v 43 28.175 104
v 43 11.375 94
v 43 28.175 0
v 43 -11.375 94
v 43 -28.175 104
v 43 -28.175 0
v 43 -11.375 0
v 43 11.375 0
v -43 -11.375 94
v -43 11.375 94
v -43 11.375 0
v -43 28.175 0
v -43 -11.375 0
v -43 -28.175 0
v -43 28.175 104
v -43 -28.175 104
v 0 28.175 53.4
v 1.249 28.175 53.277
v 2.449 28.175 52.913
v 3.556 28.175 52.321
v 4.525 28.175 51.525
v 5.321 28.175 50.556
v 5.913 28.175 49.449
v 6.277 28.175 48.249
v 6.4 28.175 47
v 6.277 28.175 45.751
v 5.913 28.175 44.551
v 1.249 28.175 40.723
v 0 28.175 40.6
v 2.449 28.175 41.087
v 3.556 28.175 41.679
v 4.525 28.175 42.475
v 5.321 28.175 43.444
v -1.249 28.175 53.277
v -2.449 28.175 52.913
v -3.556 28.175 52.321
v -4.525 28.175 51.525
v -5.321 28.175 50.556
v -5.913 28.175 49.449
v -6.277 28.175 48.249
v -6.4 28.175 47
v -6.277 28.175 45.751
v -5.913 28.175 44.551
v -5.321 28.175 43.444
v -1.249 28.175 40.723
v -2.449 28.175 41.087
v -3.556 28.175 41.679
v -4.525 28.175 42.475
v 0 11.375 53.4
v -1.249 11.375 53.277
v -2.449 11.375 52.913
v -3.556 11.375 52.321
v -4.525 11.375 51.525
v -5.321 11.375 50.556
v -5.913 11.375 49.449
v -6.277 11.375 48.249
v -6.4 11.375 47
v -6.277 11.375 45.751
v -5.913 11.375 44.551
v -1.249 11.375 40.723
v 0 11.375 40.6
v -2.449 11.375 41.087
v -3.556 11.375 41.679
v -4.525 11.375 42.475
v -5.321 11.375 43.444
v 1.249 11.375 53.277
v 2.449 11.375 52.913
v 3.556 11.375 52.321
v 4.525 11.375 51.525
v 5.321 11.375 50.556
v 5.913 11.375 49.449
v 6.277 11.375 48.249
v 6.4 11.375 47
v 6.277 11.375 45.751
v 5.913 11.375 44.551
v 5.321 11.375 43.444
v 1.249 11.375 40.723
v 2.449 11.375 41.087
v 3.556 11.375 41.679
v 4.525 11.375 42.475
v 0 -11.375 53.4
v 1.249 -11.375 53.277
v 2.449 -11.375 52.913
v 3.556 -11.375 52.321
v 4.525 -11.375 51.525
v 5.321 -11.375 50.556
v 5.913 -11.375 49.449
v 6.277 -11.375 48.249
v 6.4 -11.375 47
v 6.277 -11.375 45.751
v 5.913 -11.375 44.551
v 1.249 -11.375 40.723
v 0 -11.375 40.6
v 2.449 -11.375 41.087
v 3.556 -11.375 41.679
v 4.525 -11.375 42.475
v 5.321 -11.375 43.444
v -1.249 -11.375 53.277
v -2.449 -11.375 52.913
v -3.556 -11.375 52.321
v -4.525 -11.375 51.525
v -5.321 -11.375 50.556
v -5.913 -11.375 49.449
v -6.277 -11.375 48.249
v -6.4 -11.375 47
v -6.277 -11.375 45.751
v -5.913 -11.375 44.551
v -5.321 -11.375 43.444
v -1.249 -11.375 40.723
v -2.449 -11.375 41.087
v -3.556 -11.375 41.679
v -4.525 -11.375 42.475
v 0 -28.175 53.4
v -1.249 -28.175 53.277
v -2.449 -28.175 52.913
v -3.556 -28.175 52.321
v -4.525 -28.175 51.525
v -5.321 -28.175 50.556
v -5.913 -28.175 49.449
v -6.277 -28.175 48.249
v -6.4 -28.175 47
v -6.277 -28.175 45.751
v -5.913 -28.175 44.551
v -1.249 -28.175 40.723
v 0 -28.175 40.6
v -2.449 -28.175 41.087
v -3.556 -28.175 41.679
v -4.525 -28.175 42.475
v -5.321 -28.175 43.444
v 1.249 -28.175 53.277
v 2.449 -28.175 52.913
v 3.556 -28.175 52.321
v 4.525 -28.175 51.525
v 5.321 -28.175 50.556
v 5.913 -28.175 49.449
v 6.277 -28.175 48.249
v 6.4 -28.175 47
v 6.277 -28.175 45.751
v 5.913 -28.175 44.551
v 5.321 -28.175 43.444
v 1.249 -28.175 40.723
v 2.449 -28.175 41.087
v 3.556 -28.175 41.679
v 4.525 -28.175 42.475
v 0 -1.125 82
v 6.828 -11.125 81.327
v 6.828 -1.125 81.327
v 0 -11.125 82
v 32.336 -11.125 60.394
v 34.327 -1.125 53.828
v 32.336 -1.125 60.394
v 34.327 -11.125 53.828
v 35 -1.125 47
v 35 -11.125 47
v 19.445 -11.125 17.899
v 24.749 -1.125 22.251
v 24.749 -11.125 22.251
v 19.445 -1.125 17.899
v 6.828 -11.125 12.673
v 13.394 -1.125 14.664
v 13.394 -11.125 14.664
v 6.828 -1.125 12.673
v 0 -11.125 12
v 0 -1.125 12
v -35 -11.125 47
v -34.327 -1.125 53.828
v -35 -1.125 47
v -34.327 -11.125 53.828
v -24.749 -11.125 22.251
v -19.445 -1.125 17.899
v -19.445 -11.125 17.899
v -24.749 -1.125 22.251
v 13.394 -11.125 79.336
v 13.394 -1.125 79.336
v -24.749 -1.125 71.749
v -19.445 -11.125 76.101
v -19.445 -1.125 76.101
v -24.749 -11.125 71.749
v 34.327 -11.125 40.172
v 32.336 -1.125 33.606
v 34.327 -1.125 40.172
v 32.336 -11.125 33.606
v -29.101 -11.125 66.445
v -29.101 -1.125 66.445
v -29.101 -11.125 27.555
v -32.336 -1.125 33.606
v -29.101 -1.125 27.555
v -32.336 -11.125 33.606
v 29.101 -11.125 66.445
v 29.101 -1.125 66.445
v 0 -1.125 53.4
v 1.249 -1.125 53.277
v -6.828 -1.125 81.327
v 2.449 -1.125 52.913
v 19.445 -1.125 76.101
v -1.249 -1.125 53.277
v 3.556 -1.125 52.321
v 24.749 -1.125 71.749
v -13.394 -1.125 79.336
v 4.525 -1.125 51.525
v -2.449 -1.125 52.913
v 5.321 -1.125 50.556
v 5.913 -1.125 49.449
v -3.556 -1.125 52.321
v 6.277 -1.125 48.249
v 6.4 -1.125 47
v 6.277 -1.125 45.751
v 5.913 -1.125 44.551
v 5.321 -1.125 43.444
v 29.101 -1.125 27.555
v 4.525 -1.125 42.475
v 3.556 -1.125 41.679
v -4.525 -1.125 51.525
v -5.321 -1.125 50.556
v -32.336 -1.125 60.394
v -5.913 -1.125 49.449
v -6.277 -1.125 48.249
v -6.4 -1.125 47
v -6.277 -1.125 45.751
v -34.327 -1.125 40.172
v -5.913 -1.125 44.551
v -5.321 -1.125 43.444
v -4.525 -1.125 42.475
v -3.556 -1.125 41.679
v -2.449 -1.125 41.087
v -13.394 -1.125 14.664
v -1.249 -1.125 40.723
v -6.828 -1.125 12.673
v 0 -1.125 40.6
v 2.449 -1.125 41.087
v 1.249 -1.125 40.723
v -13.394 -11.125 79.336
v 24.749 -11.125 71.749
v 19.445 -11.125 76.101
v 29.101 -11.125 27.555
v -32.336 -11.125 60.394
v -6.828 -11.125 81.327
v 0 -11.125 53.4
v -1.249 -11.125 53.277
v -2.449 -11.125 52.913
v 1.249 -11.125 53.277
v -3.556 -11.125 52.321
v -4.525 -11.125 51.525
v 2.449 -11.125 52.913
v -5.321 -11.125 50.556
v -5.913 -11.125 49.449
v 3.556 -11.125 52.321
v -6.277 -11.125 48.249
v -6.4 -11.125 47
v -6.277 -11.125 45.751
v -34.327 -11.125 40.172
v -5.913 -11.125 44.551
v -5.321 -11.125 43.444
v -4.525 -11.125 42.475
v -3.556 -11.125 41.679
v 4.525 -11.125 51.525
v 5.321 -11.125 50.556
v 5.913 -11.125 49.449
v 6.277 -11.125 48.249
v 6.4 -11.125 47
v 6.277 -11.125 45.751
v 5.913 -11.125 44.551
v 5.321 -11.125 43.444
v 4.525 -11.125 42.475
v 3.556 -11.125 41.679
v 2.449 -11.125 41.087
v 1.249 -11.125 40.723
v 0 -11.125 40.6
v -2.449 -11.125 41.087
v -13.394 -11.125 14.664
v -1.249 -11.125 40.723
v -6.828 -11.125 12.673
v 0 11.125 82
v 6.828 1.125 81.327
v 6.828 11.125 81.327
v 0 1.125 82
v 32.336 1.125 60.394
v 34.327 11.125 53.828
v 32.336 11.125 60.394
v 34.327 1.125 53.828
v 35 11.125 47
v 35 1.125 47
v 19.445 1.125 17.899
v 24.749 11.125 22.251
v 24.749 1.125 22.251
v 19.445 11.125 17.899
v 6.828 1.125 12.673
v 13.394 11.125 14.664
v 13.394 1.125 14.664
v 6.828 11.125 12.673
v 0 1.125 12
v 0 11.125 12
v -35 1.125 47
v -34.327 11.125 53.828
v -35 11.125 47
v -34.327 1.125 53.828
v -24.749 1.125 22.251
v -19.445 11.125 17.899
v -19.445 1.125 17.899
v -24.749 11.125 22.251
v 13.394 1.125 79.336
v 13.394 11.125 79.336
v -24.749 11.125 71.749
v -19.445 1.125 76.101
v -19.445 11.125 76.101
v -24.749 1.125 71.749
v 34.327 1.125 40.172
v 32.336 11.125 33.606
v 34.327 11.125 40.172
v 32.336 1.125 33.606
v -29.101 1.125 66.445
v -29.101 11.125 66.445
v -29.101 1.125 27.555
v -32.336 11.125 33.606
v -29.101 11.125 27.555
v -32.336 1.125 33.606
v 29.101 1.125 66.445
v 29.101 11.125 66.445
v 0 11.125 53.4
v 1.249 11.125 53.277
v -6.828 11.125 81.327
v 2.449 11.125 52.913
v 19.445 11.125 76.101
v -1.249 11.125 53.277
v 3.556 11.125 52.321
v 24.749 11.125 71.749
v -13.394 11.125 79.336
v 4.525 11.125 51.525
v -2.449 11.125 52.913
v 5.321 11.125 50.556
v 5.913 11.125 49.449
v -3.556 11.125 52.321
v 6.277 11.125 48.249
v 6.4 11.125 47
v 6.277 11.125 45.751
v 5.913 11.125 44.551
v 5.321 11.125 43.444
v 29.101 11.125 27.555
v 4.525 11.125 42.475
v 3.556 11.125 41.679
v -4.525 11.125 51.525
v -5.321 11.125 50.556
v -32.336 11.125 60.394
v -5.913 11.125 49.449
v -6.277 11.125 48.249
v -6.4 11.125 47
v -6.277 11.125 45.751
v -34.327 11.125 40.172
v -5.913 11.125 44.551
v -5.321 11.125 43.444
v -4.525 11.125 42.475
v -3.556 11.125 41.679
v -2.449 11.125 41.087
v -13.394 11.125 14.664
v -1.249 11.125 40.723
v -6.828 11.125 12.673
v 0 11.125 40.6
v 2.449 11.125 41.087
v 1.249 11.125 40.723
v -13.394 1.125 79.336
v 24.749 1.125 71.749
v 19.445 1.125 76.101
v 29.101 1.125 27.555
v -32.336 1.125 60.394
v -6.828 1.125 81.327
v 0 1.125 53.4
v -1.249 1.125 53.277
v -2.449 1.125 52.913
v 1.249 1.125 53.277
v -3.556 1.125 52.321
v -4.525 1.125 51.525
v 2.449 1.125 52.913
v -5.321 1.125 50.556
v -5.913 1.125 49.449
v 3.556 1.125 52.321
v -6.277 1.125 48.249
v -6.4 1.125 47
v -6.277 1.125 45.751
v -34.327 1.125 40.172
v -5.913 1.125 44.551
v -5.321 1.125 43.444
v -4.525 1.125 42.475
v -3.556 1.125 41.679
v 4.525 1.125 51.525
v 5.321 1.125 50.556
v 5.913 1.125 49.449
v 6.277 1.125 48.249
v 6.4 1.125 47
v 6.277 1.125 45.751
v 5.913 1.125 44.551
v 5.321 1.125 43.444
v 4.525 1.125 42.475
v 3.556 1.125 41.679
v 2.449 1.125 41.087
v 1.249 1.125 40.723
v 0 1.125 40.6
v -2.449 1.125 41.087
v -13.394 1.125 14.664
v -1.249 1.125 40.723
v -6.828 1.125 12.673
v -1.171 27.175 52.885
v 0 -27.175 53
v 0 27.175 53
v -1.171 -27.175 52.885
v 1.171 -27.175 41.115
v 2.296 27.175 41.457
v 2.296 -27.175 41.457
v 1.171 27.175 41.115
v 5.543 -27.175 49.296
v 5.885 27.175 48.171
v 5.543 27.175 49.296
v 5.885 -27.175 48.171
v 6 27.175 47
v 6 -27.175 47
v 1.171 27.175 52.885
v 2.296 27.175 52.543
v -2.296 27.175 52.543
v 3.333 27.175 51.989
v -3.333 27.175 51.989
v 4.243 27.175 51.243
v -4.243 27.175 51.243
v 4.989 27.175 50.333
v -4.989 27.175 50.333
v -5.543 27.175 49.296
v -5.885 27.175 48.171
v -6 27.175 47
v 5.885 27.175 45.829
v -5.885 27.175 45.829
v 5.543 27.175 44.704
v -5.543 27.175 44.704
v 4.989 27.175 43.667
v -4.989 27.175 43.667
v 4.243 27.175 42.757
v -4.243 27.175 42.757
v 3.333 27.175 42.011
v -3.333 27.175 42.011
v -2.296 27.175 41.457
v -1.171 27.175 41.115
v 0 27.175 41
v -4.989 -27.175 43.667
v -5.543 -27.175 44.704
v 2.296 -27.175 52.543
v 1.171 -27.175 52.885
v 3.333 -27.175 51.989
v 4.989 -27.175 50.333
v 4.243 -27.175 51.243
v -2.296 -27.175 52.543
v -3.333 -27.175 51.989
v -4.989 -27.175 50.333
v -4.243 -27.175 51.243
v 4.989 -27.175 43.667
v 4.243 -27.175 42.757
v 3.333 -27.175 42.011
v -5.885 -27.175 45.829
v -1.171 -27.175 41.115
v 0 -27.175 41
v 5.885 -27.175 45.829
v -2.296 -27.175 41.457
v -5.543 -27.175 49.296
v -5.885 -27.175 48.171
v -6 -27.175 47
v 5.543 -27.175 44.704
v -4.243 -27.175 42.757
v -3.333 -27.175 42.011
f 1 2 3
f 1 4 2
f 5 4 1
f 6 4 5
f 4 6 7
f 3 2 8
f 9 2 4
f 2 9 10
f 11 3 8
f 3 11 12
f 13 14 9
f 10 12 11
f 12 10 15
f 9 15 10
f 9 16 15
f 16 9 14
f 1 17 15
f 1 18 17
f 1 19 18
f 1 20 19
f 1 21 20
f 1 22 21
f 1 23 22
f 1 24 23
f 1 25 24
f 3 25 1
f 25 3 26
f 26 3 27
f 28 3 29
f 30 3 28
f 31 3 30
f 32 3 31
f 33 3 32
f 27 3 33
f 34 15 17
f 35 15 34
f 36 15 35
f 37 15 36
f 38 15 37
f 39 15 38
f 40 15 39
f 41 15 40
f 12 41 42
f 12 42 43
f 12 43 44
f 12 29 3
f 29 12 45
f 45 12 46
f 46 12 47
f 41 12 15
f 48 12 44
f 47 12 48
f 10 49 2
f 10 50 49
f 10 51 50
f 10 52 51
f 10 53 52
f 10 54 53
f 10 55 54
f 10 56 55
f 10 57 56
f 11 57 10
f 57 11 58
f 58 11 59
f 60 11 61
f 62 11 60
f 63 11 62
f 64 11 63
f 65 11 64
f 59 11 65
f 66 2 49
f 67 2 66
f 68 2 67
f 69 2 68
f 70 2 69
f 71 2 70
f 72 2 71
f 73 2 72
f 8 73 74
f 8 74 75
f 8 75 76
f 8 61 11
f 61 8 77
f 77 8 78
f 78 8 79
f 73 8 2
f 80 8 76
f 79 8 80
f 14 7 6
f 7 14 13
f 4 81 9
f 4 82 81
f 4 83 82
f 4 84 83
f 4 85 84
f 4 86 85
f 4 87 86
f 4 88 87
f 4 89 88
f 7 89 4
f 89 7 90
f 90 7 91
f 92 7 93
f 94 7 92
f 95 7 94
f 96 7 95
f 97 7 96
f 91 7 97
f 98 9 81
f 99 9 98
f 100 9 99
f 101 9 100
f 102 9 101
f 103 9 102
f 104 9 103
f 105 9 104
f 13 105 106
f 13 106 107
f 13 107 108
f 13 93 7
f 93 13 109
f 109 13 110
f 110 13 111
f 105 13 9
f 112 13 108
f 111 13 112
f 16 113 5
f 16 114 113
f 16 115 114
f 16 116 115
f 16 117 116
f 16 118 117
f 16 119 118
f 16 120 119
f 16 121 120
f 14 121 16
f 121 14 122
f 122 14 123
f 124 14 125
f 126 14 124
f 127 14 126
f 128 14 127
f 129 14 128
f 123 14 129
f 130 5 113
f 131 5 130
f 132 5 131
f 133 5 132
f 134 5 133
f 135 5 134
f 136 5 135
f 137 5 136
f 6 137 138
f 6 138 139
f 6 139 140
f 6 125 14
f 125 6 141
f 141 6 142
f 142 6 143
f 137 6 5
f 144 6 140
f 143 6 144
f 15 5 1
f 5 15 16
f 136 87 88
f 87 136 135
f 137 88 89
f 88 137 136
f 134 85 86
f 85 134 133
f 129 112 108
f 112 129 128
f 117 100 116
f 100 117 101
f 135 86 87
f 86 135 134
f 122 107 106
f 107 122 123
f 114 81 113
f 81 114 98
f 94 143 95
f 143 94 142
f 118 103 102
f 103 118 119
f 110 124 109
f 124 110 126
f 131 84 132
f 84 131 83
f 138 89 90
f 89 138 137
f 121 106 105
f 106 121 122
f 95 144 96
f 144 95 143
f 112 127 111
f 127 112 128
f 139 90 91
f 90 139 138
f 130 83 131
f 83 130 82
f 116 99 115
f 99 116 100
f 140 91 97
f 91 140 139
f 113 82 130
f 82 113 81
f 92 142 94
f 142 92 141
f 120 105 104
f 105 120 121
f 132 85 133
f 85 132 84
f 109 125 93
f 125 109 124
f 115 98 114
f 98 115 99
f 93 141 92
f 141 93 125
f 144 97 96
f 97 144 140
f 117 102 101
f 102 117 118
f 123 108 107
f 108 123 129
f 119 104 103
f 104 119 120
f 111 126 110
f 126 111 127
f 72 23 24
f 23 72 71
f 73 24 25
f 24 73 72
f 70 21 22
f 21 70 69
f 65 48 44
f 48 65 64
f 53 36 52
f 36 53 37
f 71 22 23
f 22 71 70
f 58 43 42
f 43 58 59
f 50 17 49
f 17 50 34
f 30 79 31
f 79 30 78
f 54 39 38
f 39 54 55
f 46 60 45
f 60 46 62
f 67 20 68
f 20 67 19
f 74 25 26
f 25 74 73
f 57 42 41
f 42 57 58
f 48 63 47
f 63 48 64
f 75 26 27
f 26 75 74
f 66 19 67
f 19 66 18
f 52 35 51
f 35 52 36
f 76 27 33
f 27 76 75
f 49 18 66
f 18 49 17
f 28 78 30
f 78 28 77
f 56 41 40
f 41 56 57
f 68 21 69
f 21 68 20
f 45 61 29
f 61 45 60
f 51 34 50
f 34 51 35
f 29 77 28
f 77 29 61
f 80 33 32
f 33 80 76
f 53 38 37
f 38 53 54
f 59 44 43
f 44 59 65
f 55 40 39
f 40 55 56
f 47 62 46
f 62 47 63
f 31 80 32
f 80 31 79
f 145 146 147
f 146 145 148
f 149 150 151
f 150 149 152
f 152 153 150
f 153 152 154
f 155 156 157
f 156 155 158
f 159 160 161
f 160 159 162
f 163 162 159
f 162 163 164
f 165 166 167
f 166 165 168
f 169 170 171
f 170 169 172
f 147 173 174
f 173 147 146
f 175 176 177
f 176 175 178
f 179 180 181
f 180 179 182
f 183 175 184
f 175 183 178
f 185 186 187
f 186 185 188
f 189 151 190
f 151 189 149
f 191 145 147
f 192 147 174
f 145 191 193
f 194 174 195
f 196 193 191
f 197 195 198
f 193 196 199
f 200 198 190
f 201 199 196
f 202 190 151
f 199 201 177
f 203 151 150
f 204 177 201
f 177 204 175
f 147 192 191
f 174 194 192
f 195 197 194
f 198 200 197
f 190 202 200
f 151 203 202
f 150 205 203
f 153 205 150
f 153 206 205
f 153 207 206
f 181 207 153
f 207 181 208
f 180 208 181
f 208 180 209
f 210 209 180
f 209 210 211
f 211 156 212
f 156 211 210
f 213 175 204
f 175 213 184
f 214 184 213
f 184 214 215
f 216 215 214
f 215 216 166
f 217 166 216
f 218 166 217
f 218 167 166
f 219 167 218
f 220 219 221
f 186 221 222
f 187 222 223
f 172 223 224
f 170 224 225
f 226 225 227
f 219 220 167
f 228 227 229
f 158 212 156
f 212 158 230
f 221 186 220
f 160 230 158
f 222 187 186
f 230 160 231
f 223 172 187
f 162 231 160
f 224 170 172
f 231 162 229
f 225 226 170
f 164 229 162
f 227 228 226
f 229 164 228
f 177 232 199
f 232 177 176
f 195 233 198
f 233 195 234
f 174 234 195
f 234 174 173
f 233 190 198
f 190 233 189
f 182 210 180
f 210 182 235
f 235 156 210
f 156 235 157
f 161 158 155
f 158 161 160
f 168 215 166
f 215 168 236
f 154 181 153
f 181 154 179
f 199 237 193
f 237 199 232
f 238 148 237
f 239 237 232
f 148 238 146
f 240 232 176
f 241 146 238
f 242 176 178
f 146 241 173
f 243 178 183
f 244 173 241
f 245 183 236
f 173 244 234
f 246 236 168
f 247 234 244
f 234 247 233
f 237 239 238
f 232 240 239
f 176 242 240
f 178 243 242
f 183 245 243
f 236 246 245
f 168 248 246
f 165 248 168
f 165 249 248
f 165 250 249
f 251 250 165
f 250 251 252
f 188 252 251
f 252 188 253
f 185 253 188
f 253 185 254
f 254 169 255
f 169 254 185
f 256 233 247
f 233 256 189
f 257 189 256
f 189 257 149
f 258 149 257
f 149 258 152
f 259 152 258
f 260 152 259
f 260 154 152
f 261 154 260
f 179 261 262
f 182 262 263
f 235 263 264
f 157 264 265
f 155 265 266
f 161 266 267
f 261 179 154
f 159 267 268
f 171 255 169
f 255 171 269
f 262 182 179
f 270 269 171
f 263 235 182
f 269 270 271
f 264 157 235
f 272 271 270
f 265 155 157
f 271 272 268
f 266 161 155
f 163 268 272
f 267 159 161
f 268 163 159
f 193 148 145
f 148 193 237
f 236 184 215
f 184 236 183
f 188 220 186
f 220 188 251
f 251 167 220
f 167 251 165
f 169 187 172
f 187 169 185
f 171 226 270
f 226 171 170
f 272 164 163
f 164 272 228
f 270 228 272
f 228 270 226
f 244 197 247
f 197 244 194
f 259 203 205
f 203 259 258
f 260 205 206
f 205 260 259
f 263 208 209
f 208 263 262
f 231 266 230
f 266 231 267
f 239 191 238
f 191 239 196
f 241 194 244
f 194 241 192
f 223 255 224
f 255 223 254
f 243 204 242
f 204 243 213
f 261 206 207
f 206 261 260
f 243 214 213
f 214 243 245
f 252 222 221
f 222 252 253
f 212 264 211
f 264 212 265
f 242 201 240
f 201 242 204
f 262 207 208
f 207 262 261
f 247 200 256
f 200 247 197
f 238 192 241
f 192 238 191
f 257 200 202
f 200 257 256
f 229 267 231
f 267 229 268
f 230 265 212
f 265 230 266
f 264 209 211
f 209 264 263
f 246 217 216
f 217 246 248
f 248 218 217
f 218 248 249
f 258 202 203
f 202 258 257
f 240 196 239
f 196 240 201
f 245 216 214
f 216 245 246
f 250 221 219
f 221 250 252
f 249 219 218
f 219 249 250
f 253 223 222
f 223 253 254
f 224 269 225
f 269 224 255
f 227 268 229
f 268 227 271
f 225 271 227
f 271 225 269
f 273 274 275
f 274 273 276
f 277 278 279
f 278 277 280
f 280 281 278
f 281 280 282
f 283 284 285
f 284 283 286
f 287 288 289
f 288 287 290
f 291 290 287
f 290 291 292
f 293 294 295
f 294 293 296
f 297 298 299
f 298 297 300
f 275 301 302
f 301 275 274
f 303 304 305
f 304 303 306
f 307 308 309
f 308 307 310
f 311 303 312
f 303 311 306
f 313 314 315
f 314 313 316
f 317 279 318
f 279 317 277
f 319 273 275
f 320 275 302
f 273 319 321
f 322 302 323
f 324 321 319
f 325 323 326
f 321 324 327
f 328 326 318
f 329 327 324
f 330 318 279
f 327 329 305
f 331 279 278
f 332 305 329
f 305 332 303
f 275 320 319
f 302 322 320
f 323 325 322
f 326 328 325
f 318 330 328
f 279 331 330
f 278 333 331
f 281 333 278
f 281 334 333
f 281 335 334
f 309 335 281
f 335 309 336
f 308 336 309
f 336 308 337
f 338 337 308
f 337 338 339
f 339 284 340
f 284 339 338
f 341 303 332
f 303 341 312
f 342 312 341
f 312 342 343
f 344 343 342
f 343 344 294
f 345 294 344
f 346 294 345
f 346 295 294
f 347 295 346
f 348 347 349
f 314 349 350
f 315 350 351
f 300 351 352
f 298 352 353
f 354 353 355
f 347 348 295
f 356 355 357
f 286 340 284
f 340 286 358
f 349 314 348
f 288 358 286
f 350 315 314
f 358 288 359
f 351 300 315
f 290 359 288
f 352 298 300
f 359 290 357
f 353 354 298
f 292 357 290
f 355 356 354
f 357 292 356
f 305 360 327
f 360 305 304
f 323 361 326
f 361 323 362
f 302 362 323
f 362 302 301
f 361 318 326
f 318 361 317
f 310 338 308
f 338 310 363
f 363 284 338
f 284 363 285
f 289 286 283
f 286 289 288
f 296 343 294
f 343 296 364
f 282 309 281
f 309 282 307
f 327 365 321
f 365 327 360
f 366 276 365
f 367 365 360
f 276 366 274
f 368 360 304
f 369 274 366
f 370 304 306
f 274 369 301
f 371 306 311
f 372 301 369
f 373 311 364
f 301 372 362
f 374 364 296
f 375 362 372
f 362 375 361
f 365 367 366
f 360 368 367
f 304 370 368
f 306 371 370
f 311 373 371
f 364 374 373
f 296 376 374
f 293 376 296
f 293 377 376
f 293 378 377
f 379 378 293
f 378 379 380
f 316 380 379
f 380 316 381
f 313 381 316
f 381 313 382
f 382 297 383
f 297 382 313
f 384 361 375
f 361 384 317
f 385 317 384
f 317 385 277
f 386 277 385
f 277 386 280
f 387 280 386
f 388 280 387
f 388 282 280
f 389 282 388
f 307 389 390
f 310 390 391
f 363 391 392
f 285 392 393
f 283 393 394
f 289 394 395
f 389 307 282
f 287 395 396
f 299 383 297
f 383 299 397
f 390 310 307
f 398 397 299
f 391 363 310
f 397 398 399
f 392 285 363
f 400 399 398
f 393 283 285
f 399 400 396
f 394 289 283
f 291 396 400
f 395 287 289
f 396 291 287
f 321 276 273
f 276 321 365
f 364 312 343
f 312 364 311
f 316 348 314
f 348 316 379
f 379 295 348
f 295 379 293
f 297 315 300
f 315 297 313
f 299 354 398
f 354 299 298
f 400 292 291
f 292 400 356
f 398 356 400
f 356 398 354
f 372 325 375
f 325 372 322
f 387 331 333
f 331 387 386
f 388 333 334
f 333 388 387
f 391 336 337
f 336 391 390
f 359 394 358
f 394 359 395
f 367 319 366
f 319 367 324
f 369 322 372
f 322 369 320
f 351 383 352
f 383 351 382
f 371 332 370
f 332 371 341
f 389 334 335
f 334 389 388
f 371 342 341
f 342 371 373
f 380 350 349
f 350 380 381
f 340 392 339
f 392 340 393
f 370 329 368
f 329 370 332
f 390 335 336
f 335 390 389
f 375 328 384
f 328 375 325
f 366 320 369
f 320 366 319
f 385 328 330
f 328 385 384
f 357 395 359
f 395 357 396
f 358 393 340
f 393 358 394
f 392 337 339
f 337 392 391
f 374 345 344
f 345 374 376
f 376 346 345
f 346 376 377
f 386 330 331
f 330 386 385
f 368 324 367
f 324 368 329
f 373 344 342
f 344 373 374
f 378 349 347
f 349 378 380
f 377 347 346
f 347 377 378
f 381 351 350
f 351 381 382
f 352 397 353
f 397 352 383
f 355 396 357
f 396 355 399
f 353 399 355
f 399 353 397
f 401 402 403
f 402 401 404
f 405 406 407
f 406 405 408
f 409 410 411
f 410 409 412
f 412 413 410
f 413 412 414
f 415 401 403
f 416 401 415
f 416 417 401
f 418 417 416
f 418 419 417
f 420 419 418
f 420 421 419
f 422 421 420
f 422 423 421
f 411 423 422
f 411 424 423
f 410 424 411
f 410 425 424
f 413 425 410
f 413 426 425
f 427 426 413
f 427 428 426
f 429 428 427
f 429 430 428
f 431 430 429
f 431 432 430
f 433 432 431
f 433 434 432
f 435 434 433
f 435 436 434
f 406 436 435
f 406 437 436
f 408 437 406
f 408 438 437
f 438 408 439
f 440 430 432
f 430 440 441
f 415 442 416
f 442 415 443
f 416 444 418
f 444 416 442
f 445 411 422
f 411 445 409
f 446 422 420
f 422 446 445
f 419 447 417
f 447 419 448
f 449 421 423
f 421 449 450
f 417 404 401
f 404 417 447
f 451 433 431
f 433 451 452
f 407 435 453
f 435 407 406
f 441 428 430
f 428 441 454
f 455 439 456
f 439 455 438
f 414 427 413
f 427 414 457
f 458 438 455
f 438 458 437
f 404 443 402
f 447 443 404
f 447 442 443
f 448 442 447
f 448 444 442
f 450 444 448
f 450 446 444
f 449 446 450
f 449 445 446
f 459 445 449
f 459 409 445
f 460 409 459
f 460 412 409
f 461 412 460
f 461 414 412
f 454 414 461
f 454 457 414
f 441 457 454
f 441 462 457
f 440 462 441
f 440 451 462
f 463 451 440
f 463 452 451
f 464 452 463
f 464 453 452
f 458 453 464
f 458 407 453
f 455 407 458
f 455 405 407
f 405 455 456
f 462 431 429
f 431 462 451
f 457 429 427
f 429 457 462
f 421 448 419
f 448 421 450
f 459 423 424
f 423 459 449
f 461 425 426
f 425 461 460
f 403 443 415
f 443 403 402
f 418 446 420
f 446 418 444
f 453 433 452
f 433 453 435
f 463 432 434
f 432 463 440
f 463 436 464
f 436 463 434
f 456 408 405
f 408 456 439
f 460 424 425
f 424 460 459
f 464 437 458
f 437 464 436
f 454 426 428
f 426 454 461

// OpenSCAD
$fn = 32;

// ------------------------------------------------------------------------
// Trolley wheel set: wheels d70, fork 94 mm tall
// Every part is its own module, assembly() places every instance.
// ------------------------------------------------------------------------

// --- part 1 ---
module trolley_fork() {
  difference() {
    union() {
      translate([-43, 11.375, 0]) cube([86, 16.8, 94]);
      translate([-43, -28.175, 0]) cube([86, 16.8, 94]);
      translate([-43, -28.175, 94]) cube([86, 56.35, 10]);
    }
    translate([0, -19.775, 47]) rotate([90, 0, 0]) cylinder(h = 18.8, d = 12.8, center = true);
    translate([0, 19.775, 47]) rotate([90, 0, 0]) cylinder(h = 18.8, d = 12.8, center = true);
  }
}

// --- part 2 ---
module trolley_wheel() {
  difference() {
      translate([0, 0, 0]) cylinder(h = 10, d = 70);
      translate([0, 0, -1]) cylinder(h = 12, d = 12.8);
    }
}

// --- part 3 ---
module trolley_axle() {
  translate([0, 0, -27.175]) cylinder(h = 54.35, d = 12);
}

// --- assembly ---
module assembly() {
  color([0.80, 0.24, 0.20]) translate([0, 0, 0]) rotate([0, 0, 0]) trolley_fork();
  color([0.20, 0.45, 0.75]) translate([0, -1.125, 47]) rotate([90, 0, 0]) trolley_wheel();
  color([0.25, 0.62, 0.32]) translate([0, 11.125, 47]) rotate([90, 0, 0]) trolley_wheel();
  color([0.92, 0.70, 0.18]) translate([0, 0, 47]) rotate([90, 0, 0]) trolley_axle();
}

assembly();
